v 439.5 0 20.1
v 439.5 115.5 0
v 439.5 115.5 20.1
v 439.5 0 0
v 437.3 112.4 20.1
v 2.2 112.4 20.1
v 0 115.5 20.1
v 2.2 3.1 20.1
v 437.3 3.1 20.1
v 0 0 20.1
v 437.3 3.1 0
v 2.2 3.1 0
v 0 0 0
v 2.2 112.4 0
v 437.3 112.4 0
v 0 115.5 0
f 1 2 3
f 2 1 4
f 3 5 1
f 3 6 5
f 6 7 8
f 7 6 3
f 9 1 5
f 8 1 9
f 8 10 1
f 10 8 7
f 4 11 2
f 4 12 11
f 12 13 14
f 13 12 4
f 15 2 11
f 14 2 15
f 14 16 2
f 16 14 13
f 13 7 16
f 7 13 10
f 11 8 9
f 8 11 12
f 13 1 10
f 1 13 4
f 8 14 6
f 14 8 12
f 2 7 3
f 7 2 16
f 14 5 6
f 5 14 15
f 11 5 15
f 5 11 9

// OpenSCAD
tlr=2.2;
tou=3.1;
width=439.5;
height=115.5;
depth=20.1;

cube([width,tou,depth]);

cube([tlr,height,depth]);

translate([0,height-tou,0])
cube([width,tou,depth]);

translate([width-tlr,0,0])
cube([tlr,height,depth]);
